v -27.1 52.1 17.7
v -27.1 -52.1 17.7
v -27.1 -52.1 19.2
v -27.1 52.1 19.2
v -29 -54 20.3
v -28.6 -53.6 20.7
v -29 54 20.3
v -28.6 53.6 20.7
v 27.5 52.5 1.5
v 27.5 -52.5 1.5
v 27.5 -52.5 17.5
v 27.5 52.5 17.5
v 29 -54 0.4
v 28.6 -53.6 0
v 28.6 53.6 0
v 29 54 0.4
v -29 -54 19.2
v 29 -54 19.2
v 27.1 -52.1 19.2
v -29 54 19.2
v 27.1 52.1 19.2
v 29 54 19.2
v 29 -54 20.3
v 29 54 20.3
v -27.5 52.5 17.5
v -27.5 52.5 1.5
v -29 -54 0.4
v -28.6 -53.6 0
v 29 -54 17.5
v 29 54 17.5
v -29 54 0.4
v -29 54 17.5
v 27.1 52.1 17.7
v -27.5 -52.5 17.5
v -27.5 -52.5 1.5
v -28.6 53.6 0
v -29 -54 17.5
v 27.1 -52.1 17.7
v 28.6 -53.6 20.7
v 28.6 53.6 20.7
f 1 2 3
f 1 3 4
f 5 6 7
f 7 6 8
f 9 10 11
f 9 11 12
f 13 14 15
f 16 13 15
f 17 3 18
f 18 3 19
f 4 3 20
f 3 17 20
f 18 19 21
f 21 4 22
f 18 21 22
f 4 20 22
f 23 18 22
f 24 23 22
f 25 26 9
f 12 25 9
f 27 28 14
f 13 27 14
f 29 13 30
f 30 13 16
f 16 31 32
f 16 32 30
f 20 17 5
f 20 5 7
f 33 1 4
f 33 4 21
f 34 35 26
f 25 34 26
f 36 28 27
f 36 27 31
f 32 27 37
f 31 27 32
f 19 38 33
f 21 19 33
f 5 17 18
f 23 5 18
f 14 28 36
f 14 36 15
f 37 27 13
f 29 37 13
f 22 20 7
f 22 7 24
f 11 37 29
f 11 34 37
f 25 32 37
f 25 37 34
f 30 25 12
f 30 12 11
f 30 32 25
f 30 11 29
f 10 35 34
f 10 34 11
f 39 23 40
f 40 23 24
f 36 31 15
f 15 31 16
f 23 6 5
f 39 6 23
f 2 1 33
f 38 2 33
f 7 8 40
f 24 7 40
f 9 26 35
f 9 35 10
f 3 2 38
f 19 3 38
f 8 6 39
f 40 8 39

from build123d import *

# Parameters (mm, degrees)
F0_W      = 58
F0_H      = 108
F1_DEPTH  = 1.5
F2_W      = 58
F2_H      = 108
F2_W_2    = 55
F2_H_2    = 105
F3_DEPTH  = 16
F5_W      = 54.2
F5_H      = 104.2
F6_DEPTH  = 1.5
F7_W      = 58
F7_H      = 108
F8_DEPTH  = 1.5
F9_SIZE   = 0.4
F9_2_SIZE = 0.4


with BuildPart() as f1:
    # F0 (on Top) → F1 (new body)
    with BuildSketch(Plane.XY):
        Rectangle(F0_W, F0_H)
    extrude(amount=F1_DEPTH)

    # F2 (on face) → F3 (join)
    with BuildSketch(Plane.XY.offset(1.5)):
        Rectangle(F2_W, F2_H)
        Rectangle(F2_W_2, F2_H_2, mode=Mode.SUBTRACT)
    extrude(amount=F3_DEPTH)

    # F9#2
    f9_2_edges = [f1.edges().sort_by_distance(p)[0] for p in [
        (0, -54, 0),
        (29, 0, 0),
        (0, 54, 0),
        (-29, 0, 0),
    ]]
    chamfer(f9_2_edges, length=F9_2_SIZE)


with BuildPart() as f6:
    # F5 (on offset) → F6 (new body)
    with BuildSketch(Plane.XY.offset(17.7)):
        Rectangle(F5_W, F5_H)
    extrude(amount=F6_DEPTH)

    # F7 (on face) → F8 (join)
    with BuildSketch(Plane.XY.offset(19.2)):
        Rectangle(F7_W, F7_H)
    extrude(amount=F8_DEPTH)

    # F9
    f9_edges = [f6.edges().sort_by_distance(p)[0] for p in [
        (0, -54, 20.7),
        (29, 0, 20.7),
        (0, 54, 20.7),
        (-29, 0, 20.7),
    ]]
    chamfer(f9_edges, length=F9_SIZE)


solid = Compound([f1.part, f6.part])
